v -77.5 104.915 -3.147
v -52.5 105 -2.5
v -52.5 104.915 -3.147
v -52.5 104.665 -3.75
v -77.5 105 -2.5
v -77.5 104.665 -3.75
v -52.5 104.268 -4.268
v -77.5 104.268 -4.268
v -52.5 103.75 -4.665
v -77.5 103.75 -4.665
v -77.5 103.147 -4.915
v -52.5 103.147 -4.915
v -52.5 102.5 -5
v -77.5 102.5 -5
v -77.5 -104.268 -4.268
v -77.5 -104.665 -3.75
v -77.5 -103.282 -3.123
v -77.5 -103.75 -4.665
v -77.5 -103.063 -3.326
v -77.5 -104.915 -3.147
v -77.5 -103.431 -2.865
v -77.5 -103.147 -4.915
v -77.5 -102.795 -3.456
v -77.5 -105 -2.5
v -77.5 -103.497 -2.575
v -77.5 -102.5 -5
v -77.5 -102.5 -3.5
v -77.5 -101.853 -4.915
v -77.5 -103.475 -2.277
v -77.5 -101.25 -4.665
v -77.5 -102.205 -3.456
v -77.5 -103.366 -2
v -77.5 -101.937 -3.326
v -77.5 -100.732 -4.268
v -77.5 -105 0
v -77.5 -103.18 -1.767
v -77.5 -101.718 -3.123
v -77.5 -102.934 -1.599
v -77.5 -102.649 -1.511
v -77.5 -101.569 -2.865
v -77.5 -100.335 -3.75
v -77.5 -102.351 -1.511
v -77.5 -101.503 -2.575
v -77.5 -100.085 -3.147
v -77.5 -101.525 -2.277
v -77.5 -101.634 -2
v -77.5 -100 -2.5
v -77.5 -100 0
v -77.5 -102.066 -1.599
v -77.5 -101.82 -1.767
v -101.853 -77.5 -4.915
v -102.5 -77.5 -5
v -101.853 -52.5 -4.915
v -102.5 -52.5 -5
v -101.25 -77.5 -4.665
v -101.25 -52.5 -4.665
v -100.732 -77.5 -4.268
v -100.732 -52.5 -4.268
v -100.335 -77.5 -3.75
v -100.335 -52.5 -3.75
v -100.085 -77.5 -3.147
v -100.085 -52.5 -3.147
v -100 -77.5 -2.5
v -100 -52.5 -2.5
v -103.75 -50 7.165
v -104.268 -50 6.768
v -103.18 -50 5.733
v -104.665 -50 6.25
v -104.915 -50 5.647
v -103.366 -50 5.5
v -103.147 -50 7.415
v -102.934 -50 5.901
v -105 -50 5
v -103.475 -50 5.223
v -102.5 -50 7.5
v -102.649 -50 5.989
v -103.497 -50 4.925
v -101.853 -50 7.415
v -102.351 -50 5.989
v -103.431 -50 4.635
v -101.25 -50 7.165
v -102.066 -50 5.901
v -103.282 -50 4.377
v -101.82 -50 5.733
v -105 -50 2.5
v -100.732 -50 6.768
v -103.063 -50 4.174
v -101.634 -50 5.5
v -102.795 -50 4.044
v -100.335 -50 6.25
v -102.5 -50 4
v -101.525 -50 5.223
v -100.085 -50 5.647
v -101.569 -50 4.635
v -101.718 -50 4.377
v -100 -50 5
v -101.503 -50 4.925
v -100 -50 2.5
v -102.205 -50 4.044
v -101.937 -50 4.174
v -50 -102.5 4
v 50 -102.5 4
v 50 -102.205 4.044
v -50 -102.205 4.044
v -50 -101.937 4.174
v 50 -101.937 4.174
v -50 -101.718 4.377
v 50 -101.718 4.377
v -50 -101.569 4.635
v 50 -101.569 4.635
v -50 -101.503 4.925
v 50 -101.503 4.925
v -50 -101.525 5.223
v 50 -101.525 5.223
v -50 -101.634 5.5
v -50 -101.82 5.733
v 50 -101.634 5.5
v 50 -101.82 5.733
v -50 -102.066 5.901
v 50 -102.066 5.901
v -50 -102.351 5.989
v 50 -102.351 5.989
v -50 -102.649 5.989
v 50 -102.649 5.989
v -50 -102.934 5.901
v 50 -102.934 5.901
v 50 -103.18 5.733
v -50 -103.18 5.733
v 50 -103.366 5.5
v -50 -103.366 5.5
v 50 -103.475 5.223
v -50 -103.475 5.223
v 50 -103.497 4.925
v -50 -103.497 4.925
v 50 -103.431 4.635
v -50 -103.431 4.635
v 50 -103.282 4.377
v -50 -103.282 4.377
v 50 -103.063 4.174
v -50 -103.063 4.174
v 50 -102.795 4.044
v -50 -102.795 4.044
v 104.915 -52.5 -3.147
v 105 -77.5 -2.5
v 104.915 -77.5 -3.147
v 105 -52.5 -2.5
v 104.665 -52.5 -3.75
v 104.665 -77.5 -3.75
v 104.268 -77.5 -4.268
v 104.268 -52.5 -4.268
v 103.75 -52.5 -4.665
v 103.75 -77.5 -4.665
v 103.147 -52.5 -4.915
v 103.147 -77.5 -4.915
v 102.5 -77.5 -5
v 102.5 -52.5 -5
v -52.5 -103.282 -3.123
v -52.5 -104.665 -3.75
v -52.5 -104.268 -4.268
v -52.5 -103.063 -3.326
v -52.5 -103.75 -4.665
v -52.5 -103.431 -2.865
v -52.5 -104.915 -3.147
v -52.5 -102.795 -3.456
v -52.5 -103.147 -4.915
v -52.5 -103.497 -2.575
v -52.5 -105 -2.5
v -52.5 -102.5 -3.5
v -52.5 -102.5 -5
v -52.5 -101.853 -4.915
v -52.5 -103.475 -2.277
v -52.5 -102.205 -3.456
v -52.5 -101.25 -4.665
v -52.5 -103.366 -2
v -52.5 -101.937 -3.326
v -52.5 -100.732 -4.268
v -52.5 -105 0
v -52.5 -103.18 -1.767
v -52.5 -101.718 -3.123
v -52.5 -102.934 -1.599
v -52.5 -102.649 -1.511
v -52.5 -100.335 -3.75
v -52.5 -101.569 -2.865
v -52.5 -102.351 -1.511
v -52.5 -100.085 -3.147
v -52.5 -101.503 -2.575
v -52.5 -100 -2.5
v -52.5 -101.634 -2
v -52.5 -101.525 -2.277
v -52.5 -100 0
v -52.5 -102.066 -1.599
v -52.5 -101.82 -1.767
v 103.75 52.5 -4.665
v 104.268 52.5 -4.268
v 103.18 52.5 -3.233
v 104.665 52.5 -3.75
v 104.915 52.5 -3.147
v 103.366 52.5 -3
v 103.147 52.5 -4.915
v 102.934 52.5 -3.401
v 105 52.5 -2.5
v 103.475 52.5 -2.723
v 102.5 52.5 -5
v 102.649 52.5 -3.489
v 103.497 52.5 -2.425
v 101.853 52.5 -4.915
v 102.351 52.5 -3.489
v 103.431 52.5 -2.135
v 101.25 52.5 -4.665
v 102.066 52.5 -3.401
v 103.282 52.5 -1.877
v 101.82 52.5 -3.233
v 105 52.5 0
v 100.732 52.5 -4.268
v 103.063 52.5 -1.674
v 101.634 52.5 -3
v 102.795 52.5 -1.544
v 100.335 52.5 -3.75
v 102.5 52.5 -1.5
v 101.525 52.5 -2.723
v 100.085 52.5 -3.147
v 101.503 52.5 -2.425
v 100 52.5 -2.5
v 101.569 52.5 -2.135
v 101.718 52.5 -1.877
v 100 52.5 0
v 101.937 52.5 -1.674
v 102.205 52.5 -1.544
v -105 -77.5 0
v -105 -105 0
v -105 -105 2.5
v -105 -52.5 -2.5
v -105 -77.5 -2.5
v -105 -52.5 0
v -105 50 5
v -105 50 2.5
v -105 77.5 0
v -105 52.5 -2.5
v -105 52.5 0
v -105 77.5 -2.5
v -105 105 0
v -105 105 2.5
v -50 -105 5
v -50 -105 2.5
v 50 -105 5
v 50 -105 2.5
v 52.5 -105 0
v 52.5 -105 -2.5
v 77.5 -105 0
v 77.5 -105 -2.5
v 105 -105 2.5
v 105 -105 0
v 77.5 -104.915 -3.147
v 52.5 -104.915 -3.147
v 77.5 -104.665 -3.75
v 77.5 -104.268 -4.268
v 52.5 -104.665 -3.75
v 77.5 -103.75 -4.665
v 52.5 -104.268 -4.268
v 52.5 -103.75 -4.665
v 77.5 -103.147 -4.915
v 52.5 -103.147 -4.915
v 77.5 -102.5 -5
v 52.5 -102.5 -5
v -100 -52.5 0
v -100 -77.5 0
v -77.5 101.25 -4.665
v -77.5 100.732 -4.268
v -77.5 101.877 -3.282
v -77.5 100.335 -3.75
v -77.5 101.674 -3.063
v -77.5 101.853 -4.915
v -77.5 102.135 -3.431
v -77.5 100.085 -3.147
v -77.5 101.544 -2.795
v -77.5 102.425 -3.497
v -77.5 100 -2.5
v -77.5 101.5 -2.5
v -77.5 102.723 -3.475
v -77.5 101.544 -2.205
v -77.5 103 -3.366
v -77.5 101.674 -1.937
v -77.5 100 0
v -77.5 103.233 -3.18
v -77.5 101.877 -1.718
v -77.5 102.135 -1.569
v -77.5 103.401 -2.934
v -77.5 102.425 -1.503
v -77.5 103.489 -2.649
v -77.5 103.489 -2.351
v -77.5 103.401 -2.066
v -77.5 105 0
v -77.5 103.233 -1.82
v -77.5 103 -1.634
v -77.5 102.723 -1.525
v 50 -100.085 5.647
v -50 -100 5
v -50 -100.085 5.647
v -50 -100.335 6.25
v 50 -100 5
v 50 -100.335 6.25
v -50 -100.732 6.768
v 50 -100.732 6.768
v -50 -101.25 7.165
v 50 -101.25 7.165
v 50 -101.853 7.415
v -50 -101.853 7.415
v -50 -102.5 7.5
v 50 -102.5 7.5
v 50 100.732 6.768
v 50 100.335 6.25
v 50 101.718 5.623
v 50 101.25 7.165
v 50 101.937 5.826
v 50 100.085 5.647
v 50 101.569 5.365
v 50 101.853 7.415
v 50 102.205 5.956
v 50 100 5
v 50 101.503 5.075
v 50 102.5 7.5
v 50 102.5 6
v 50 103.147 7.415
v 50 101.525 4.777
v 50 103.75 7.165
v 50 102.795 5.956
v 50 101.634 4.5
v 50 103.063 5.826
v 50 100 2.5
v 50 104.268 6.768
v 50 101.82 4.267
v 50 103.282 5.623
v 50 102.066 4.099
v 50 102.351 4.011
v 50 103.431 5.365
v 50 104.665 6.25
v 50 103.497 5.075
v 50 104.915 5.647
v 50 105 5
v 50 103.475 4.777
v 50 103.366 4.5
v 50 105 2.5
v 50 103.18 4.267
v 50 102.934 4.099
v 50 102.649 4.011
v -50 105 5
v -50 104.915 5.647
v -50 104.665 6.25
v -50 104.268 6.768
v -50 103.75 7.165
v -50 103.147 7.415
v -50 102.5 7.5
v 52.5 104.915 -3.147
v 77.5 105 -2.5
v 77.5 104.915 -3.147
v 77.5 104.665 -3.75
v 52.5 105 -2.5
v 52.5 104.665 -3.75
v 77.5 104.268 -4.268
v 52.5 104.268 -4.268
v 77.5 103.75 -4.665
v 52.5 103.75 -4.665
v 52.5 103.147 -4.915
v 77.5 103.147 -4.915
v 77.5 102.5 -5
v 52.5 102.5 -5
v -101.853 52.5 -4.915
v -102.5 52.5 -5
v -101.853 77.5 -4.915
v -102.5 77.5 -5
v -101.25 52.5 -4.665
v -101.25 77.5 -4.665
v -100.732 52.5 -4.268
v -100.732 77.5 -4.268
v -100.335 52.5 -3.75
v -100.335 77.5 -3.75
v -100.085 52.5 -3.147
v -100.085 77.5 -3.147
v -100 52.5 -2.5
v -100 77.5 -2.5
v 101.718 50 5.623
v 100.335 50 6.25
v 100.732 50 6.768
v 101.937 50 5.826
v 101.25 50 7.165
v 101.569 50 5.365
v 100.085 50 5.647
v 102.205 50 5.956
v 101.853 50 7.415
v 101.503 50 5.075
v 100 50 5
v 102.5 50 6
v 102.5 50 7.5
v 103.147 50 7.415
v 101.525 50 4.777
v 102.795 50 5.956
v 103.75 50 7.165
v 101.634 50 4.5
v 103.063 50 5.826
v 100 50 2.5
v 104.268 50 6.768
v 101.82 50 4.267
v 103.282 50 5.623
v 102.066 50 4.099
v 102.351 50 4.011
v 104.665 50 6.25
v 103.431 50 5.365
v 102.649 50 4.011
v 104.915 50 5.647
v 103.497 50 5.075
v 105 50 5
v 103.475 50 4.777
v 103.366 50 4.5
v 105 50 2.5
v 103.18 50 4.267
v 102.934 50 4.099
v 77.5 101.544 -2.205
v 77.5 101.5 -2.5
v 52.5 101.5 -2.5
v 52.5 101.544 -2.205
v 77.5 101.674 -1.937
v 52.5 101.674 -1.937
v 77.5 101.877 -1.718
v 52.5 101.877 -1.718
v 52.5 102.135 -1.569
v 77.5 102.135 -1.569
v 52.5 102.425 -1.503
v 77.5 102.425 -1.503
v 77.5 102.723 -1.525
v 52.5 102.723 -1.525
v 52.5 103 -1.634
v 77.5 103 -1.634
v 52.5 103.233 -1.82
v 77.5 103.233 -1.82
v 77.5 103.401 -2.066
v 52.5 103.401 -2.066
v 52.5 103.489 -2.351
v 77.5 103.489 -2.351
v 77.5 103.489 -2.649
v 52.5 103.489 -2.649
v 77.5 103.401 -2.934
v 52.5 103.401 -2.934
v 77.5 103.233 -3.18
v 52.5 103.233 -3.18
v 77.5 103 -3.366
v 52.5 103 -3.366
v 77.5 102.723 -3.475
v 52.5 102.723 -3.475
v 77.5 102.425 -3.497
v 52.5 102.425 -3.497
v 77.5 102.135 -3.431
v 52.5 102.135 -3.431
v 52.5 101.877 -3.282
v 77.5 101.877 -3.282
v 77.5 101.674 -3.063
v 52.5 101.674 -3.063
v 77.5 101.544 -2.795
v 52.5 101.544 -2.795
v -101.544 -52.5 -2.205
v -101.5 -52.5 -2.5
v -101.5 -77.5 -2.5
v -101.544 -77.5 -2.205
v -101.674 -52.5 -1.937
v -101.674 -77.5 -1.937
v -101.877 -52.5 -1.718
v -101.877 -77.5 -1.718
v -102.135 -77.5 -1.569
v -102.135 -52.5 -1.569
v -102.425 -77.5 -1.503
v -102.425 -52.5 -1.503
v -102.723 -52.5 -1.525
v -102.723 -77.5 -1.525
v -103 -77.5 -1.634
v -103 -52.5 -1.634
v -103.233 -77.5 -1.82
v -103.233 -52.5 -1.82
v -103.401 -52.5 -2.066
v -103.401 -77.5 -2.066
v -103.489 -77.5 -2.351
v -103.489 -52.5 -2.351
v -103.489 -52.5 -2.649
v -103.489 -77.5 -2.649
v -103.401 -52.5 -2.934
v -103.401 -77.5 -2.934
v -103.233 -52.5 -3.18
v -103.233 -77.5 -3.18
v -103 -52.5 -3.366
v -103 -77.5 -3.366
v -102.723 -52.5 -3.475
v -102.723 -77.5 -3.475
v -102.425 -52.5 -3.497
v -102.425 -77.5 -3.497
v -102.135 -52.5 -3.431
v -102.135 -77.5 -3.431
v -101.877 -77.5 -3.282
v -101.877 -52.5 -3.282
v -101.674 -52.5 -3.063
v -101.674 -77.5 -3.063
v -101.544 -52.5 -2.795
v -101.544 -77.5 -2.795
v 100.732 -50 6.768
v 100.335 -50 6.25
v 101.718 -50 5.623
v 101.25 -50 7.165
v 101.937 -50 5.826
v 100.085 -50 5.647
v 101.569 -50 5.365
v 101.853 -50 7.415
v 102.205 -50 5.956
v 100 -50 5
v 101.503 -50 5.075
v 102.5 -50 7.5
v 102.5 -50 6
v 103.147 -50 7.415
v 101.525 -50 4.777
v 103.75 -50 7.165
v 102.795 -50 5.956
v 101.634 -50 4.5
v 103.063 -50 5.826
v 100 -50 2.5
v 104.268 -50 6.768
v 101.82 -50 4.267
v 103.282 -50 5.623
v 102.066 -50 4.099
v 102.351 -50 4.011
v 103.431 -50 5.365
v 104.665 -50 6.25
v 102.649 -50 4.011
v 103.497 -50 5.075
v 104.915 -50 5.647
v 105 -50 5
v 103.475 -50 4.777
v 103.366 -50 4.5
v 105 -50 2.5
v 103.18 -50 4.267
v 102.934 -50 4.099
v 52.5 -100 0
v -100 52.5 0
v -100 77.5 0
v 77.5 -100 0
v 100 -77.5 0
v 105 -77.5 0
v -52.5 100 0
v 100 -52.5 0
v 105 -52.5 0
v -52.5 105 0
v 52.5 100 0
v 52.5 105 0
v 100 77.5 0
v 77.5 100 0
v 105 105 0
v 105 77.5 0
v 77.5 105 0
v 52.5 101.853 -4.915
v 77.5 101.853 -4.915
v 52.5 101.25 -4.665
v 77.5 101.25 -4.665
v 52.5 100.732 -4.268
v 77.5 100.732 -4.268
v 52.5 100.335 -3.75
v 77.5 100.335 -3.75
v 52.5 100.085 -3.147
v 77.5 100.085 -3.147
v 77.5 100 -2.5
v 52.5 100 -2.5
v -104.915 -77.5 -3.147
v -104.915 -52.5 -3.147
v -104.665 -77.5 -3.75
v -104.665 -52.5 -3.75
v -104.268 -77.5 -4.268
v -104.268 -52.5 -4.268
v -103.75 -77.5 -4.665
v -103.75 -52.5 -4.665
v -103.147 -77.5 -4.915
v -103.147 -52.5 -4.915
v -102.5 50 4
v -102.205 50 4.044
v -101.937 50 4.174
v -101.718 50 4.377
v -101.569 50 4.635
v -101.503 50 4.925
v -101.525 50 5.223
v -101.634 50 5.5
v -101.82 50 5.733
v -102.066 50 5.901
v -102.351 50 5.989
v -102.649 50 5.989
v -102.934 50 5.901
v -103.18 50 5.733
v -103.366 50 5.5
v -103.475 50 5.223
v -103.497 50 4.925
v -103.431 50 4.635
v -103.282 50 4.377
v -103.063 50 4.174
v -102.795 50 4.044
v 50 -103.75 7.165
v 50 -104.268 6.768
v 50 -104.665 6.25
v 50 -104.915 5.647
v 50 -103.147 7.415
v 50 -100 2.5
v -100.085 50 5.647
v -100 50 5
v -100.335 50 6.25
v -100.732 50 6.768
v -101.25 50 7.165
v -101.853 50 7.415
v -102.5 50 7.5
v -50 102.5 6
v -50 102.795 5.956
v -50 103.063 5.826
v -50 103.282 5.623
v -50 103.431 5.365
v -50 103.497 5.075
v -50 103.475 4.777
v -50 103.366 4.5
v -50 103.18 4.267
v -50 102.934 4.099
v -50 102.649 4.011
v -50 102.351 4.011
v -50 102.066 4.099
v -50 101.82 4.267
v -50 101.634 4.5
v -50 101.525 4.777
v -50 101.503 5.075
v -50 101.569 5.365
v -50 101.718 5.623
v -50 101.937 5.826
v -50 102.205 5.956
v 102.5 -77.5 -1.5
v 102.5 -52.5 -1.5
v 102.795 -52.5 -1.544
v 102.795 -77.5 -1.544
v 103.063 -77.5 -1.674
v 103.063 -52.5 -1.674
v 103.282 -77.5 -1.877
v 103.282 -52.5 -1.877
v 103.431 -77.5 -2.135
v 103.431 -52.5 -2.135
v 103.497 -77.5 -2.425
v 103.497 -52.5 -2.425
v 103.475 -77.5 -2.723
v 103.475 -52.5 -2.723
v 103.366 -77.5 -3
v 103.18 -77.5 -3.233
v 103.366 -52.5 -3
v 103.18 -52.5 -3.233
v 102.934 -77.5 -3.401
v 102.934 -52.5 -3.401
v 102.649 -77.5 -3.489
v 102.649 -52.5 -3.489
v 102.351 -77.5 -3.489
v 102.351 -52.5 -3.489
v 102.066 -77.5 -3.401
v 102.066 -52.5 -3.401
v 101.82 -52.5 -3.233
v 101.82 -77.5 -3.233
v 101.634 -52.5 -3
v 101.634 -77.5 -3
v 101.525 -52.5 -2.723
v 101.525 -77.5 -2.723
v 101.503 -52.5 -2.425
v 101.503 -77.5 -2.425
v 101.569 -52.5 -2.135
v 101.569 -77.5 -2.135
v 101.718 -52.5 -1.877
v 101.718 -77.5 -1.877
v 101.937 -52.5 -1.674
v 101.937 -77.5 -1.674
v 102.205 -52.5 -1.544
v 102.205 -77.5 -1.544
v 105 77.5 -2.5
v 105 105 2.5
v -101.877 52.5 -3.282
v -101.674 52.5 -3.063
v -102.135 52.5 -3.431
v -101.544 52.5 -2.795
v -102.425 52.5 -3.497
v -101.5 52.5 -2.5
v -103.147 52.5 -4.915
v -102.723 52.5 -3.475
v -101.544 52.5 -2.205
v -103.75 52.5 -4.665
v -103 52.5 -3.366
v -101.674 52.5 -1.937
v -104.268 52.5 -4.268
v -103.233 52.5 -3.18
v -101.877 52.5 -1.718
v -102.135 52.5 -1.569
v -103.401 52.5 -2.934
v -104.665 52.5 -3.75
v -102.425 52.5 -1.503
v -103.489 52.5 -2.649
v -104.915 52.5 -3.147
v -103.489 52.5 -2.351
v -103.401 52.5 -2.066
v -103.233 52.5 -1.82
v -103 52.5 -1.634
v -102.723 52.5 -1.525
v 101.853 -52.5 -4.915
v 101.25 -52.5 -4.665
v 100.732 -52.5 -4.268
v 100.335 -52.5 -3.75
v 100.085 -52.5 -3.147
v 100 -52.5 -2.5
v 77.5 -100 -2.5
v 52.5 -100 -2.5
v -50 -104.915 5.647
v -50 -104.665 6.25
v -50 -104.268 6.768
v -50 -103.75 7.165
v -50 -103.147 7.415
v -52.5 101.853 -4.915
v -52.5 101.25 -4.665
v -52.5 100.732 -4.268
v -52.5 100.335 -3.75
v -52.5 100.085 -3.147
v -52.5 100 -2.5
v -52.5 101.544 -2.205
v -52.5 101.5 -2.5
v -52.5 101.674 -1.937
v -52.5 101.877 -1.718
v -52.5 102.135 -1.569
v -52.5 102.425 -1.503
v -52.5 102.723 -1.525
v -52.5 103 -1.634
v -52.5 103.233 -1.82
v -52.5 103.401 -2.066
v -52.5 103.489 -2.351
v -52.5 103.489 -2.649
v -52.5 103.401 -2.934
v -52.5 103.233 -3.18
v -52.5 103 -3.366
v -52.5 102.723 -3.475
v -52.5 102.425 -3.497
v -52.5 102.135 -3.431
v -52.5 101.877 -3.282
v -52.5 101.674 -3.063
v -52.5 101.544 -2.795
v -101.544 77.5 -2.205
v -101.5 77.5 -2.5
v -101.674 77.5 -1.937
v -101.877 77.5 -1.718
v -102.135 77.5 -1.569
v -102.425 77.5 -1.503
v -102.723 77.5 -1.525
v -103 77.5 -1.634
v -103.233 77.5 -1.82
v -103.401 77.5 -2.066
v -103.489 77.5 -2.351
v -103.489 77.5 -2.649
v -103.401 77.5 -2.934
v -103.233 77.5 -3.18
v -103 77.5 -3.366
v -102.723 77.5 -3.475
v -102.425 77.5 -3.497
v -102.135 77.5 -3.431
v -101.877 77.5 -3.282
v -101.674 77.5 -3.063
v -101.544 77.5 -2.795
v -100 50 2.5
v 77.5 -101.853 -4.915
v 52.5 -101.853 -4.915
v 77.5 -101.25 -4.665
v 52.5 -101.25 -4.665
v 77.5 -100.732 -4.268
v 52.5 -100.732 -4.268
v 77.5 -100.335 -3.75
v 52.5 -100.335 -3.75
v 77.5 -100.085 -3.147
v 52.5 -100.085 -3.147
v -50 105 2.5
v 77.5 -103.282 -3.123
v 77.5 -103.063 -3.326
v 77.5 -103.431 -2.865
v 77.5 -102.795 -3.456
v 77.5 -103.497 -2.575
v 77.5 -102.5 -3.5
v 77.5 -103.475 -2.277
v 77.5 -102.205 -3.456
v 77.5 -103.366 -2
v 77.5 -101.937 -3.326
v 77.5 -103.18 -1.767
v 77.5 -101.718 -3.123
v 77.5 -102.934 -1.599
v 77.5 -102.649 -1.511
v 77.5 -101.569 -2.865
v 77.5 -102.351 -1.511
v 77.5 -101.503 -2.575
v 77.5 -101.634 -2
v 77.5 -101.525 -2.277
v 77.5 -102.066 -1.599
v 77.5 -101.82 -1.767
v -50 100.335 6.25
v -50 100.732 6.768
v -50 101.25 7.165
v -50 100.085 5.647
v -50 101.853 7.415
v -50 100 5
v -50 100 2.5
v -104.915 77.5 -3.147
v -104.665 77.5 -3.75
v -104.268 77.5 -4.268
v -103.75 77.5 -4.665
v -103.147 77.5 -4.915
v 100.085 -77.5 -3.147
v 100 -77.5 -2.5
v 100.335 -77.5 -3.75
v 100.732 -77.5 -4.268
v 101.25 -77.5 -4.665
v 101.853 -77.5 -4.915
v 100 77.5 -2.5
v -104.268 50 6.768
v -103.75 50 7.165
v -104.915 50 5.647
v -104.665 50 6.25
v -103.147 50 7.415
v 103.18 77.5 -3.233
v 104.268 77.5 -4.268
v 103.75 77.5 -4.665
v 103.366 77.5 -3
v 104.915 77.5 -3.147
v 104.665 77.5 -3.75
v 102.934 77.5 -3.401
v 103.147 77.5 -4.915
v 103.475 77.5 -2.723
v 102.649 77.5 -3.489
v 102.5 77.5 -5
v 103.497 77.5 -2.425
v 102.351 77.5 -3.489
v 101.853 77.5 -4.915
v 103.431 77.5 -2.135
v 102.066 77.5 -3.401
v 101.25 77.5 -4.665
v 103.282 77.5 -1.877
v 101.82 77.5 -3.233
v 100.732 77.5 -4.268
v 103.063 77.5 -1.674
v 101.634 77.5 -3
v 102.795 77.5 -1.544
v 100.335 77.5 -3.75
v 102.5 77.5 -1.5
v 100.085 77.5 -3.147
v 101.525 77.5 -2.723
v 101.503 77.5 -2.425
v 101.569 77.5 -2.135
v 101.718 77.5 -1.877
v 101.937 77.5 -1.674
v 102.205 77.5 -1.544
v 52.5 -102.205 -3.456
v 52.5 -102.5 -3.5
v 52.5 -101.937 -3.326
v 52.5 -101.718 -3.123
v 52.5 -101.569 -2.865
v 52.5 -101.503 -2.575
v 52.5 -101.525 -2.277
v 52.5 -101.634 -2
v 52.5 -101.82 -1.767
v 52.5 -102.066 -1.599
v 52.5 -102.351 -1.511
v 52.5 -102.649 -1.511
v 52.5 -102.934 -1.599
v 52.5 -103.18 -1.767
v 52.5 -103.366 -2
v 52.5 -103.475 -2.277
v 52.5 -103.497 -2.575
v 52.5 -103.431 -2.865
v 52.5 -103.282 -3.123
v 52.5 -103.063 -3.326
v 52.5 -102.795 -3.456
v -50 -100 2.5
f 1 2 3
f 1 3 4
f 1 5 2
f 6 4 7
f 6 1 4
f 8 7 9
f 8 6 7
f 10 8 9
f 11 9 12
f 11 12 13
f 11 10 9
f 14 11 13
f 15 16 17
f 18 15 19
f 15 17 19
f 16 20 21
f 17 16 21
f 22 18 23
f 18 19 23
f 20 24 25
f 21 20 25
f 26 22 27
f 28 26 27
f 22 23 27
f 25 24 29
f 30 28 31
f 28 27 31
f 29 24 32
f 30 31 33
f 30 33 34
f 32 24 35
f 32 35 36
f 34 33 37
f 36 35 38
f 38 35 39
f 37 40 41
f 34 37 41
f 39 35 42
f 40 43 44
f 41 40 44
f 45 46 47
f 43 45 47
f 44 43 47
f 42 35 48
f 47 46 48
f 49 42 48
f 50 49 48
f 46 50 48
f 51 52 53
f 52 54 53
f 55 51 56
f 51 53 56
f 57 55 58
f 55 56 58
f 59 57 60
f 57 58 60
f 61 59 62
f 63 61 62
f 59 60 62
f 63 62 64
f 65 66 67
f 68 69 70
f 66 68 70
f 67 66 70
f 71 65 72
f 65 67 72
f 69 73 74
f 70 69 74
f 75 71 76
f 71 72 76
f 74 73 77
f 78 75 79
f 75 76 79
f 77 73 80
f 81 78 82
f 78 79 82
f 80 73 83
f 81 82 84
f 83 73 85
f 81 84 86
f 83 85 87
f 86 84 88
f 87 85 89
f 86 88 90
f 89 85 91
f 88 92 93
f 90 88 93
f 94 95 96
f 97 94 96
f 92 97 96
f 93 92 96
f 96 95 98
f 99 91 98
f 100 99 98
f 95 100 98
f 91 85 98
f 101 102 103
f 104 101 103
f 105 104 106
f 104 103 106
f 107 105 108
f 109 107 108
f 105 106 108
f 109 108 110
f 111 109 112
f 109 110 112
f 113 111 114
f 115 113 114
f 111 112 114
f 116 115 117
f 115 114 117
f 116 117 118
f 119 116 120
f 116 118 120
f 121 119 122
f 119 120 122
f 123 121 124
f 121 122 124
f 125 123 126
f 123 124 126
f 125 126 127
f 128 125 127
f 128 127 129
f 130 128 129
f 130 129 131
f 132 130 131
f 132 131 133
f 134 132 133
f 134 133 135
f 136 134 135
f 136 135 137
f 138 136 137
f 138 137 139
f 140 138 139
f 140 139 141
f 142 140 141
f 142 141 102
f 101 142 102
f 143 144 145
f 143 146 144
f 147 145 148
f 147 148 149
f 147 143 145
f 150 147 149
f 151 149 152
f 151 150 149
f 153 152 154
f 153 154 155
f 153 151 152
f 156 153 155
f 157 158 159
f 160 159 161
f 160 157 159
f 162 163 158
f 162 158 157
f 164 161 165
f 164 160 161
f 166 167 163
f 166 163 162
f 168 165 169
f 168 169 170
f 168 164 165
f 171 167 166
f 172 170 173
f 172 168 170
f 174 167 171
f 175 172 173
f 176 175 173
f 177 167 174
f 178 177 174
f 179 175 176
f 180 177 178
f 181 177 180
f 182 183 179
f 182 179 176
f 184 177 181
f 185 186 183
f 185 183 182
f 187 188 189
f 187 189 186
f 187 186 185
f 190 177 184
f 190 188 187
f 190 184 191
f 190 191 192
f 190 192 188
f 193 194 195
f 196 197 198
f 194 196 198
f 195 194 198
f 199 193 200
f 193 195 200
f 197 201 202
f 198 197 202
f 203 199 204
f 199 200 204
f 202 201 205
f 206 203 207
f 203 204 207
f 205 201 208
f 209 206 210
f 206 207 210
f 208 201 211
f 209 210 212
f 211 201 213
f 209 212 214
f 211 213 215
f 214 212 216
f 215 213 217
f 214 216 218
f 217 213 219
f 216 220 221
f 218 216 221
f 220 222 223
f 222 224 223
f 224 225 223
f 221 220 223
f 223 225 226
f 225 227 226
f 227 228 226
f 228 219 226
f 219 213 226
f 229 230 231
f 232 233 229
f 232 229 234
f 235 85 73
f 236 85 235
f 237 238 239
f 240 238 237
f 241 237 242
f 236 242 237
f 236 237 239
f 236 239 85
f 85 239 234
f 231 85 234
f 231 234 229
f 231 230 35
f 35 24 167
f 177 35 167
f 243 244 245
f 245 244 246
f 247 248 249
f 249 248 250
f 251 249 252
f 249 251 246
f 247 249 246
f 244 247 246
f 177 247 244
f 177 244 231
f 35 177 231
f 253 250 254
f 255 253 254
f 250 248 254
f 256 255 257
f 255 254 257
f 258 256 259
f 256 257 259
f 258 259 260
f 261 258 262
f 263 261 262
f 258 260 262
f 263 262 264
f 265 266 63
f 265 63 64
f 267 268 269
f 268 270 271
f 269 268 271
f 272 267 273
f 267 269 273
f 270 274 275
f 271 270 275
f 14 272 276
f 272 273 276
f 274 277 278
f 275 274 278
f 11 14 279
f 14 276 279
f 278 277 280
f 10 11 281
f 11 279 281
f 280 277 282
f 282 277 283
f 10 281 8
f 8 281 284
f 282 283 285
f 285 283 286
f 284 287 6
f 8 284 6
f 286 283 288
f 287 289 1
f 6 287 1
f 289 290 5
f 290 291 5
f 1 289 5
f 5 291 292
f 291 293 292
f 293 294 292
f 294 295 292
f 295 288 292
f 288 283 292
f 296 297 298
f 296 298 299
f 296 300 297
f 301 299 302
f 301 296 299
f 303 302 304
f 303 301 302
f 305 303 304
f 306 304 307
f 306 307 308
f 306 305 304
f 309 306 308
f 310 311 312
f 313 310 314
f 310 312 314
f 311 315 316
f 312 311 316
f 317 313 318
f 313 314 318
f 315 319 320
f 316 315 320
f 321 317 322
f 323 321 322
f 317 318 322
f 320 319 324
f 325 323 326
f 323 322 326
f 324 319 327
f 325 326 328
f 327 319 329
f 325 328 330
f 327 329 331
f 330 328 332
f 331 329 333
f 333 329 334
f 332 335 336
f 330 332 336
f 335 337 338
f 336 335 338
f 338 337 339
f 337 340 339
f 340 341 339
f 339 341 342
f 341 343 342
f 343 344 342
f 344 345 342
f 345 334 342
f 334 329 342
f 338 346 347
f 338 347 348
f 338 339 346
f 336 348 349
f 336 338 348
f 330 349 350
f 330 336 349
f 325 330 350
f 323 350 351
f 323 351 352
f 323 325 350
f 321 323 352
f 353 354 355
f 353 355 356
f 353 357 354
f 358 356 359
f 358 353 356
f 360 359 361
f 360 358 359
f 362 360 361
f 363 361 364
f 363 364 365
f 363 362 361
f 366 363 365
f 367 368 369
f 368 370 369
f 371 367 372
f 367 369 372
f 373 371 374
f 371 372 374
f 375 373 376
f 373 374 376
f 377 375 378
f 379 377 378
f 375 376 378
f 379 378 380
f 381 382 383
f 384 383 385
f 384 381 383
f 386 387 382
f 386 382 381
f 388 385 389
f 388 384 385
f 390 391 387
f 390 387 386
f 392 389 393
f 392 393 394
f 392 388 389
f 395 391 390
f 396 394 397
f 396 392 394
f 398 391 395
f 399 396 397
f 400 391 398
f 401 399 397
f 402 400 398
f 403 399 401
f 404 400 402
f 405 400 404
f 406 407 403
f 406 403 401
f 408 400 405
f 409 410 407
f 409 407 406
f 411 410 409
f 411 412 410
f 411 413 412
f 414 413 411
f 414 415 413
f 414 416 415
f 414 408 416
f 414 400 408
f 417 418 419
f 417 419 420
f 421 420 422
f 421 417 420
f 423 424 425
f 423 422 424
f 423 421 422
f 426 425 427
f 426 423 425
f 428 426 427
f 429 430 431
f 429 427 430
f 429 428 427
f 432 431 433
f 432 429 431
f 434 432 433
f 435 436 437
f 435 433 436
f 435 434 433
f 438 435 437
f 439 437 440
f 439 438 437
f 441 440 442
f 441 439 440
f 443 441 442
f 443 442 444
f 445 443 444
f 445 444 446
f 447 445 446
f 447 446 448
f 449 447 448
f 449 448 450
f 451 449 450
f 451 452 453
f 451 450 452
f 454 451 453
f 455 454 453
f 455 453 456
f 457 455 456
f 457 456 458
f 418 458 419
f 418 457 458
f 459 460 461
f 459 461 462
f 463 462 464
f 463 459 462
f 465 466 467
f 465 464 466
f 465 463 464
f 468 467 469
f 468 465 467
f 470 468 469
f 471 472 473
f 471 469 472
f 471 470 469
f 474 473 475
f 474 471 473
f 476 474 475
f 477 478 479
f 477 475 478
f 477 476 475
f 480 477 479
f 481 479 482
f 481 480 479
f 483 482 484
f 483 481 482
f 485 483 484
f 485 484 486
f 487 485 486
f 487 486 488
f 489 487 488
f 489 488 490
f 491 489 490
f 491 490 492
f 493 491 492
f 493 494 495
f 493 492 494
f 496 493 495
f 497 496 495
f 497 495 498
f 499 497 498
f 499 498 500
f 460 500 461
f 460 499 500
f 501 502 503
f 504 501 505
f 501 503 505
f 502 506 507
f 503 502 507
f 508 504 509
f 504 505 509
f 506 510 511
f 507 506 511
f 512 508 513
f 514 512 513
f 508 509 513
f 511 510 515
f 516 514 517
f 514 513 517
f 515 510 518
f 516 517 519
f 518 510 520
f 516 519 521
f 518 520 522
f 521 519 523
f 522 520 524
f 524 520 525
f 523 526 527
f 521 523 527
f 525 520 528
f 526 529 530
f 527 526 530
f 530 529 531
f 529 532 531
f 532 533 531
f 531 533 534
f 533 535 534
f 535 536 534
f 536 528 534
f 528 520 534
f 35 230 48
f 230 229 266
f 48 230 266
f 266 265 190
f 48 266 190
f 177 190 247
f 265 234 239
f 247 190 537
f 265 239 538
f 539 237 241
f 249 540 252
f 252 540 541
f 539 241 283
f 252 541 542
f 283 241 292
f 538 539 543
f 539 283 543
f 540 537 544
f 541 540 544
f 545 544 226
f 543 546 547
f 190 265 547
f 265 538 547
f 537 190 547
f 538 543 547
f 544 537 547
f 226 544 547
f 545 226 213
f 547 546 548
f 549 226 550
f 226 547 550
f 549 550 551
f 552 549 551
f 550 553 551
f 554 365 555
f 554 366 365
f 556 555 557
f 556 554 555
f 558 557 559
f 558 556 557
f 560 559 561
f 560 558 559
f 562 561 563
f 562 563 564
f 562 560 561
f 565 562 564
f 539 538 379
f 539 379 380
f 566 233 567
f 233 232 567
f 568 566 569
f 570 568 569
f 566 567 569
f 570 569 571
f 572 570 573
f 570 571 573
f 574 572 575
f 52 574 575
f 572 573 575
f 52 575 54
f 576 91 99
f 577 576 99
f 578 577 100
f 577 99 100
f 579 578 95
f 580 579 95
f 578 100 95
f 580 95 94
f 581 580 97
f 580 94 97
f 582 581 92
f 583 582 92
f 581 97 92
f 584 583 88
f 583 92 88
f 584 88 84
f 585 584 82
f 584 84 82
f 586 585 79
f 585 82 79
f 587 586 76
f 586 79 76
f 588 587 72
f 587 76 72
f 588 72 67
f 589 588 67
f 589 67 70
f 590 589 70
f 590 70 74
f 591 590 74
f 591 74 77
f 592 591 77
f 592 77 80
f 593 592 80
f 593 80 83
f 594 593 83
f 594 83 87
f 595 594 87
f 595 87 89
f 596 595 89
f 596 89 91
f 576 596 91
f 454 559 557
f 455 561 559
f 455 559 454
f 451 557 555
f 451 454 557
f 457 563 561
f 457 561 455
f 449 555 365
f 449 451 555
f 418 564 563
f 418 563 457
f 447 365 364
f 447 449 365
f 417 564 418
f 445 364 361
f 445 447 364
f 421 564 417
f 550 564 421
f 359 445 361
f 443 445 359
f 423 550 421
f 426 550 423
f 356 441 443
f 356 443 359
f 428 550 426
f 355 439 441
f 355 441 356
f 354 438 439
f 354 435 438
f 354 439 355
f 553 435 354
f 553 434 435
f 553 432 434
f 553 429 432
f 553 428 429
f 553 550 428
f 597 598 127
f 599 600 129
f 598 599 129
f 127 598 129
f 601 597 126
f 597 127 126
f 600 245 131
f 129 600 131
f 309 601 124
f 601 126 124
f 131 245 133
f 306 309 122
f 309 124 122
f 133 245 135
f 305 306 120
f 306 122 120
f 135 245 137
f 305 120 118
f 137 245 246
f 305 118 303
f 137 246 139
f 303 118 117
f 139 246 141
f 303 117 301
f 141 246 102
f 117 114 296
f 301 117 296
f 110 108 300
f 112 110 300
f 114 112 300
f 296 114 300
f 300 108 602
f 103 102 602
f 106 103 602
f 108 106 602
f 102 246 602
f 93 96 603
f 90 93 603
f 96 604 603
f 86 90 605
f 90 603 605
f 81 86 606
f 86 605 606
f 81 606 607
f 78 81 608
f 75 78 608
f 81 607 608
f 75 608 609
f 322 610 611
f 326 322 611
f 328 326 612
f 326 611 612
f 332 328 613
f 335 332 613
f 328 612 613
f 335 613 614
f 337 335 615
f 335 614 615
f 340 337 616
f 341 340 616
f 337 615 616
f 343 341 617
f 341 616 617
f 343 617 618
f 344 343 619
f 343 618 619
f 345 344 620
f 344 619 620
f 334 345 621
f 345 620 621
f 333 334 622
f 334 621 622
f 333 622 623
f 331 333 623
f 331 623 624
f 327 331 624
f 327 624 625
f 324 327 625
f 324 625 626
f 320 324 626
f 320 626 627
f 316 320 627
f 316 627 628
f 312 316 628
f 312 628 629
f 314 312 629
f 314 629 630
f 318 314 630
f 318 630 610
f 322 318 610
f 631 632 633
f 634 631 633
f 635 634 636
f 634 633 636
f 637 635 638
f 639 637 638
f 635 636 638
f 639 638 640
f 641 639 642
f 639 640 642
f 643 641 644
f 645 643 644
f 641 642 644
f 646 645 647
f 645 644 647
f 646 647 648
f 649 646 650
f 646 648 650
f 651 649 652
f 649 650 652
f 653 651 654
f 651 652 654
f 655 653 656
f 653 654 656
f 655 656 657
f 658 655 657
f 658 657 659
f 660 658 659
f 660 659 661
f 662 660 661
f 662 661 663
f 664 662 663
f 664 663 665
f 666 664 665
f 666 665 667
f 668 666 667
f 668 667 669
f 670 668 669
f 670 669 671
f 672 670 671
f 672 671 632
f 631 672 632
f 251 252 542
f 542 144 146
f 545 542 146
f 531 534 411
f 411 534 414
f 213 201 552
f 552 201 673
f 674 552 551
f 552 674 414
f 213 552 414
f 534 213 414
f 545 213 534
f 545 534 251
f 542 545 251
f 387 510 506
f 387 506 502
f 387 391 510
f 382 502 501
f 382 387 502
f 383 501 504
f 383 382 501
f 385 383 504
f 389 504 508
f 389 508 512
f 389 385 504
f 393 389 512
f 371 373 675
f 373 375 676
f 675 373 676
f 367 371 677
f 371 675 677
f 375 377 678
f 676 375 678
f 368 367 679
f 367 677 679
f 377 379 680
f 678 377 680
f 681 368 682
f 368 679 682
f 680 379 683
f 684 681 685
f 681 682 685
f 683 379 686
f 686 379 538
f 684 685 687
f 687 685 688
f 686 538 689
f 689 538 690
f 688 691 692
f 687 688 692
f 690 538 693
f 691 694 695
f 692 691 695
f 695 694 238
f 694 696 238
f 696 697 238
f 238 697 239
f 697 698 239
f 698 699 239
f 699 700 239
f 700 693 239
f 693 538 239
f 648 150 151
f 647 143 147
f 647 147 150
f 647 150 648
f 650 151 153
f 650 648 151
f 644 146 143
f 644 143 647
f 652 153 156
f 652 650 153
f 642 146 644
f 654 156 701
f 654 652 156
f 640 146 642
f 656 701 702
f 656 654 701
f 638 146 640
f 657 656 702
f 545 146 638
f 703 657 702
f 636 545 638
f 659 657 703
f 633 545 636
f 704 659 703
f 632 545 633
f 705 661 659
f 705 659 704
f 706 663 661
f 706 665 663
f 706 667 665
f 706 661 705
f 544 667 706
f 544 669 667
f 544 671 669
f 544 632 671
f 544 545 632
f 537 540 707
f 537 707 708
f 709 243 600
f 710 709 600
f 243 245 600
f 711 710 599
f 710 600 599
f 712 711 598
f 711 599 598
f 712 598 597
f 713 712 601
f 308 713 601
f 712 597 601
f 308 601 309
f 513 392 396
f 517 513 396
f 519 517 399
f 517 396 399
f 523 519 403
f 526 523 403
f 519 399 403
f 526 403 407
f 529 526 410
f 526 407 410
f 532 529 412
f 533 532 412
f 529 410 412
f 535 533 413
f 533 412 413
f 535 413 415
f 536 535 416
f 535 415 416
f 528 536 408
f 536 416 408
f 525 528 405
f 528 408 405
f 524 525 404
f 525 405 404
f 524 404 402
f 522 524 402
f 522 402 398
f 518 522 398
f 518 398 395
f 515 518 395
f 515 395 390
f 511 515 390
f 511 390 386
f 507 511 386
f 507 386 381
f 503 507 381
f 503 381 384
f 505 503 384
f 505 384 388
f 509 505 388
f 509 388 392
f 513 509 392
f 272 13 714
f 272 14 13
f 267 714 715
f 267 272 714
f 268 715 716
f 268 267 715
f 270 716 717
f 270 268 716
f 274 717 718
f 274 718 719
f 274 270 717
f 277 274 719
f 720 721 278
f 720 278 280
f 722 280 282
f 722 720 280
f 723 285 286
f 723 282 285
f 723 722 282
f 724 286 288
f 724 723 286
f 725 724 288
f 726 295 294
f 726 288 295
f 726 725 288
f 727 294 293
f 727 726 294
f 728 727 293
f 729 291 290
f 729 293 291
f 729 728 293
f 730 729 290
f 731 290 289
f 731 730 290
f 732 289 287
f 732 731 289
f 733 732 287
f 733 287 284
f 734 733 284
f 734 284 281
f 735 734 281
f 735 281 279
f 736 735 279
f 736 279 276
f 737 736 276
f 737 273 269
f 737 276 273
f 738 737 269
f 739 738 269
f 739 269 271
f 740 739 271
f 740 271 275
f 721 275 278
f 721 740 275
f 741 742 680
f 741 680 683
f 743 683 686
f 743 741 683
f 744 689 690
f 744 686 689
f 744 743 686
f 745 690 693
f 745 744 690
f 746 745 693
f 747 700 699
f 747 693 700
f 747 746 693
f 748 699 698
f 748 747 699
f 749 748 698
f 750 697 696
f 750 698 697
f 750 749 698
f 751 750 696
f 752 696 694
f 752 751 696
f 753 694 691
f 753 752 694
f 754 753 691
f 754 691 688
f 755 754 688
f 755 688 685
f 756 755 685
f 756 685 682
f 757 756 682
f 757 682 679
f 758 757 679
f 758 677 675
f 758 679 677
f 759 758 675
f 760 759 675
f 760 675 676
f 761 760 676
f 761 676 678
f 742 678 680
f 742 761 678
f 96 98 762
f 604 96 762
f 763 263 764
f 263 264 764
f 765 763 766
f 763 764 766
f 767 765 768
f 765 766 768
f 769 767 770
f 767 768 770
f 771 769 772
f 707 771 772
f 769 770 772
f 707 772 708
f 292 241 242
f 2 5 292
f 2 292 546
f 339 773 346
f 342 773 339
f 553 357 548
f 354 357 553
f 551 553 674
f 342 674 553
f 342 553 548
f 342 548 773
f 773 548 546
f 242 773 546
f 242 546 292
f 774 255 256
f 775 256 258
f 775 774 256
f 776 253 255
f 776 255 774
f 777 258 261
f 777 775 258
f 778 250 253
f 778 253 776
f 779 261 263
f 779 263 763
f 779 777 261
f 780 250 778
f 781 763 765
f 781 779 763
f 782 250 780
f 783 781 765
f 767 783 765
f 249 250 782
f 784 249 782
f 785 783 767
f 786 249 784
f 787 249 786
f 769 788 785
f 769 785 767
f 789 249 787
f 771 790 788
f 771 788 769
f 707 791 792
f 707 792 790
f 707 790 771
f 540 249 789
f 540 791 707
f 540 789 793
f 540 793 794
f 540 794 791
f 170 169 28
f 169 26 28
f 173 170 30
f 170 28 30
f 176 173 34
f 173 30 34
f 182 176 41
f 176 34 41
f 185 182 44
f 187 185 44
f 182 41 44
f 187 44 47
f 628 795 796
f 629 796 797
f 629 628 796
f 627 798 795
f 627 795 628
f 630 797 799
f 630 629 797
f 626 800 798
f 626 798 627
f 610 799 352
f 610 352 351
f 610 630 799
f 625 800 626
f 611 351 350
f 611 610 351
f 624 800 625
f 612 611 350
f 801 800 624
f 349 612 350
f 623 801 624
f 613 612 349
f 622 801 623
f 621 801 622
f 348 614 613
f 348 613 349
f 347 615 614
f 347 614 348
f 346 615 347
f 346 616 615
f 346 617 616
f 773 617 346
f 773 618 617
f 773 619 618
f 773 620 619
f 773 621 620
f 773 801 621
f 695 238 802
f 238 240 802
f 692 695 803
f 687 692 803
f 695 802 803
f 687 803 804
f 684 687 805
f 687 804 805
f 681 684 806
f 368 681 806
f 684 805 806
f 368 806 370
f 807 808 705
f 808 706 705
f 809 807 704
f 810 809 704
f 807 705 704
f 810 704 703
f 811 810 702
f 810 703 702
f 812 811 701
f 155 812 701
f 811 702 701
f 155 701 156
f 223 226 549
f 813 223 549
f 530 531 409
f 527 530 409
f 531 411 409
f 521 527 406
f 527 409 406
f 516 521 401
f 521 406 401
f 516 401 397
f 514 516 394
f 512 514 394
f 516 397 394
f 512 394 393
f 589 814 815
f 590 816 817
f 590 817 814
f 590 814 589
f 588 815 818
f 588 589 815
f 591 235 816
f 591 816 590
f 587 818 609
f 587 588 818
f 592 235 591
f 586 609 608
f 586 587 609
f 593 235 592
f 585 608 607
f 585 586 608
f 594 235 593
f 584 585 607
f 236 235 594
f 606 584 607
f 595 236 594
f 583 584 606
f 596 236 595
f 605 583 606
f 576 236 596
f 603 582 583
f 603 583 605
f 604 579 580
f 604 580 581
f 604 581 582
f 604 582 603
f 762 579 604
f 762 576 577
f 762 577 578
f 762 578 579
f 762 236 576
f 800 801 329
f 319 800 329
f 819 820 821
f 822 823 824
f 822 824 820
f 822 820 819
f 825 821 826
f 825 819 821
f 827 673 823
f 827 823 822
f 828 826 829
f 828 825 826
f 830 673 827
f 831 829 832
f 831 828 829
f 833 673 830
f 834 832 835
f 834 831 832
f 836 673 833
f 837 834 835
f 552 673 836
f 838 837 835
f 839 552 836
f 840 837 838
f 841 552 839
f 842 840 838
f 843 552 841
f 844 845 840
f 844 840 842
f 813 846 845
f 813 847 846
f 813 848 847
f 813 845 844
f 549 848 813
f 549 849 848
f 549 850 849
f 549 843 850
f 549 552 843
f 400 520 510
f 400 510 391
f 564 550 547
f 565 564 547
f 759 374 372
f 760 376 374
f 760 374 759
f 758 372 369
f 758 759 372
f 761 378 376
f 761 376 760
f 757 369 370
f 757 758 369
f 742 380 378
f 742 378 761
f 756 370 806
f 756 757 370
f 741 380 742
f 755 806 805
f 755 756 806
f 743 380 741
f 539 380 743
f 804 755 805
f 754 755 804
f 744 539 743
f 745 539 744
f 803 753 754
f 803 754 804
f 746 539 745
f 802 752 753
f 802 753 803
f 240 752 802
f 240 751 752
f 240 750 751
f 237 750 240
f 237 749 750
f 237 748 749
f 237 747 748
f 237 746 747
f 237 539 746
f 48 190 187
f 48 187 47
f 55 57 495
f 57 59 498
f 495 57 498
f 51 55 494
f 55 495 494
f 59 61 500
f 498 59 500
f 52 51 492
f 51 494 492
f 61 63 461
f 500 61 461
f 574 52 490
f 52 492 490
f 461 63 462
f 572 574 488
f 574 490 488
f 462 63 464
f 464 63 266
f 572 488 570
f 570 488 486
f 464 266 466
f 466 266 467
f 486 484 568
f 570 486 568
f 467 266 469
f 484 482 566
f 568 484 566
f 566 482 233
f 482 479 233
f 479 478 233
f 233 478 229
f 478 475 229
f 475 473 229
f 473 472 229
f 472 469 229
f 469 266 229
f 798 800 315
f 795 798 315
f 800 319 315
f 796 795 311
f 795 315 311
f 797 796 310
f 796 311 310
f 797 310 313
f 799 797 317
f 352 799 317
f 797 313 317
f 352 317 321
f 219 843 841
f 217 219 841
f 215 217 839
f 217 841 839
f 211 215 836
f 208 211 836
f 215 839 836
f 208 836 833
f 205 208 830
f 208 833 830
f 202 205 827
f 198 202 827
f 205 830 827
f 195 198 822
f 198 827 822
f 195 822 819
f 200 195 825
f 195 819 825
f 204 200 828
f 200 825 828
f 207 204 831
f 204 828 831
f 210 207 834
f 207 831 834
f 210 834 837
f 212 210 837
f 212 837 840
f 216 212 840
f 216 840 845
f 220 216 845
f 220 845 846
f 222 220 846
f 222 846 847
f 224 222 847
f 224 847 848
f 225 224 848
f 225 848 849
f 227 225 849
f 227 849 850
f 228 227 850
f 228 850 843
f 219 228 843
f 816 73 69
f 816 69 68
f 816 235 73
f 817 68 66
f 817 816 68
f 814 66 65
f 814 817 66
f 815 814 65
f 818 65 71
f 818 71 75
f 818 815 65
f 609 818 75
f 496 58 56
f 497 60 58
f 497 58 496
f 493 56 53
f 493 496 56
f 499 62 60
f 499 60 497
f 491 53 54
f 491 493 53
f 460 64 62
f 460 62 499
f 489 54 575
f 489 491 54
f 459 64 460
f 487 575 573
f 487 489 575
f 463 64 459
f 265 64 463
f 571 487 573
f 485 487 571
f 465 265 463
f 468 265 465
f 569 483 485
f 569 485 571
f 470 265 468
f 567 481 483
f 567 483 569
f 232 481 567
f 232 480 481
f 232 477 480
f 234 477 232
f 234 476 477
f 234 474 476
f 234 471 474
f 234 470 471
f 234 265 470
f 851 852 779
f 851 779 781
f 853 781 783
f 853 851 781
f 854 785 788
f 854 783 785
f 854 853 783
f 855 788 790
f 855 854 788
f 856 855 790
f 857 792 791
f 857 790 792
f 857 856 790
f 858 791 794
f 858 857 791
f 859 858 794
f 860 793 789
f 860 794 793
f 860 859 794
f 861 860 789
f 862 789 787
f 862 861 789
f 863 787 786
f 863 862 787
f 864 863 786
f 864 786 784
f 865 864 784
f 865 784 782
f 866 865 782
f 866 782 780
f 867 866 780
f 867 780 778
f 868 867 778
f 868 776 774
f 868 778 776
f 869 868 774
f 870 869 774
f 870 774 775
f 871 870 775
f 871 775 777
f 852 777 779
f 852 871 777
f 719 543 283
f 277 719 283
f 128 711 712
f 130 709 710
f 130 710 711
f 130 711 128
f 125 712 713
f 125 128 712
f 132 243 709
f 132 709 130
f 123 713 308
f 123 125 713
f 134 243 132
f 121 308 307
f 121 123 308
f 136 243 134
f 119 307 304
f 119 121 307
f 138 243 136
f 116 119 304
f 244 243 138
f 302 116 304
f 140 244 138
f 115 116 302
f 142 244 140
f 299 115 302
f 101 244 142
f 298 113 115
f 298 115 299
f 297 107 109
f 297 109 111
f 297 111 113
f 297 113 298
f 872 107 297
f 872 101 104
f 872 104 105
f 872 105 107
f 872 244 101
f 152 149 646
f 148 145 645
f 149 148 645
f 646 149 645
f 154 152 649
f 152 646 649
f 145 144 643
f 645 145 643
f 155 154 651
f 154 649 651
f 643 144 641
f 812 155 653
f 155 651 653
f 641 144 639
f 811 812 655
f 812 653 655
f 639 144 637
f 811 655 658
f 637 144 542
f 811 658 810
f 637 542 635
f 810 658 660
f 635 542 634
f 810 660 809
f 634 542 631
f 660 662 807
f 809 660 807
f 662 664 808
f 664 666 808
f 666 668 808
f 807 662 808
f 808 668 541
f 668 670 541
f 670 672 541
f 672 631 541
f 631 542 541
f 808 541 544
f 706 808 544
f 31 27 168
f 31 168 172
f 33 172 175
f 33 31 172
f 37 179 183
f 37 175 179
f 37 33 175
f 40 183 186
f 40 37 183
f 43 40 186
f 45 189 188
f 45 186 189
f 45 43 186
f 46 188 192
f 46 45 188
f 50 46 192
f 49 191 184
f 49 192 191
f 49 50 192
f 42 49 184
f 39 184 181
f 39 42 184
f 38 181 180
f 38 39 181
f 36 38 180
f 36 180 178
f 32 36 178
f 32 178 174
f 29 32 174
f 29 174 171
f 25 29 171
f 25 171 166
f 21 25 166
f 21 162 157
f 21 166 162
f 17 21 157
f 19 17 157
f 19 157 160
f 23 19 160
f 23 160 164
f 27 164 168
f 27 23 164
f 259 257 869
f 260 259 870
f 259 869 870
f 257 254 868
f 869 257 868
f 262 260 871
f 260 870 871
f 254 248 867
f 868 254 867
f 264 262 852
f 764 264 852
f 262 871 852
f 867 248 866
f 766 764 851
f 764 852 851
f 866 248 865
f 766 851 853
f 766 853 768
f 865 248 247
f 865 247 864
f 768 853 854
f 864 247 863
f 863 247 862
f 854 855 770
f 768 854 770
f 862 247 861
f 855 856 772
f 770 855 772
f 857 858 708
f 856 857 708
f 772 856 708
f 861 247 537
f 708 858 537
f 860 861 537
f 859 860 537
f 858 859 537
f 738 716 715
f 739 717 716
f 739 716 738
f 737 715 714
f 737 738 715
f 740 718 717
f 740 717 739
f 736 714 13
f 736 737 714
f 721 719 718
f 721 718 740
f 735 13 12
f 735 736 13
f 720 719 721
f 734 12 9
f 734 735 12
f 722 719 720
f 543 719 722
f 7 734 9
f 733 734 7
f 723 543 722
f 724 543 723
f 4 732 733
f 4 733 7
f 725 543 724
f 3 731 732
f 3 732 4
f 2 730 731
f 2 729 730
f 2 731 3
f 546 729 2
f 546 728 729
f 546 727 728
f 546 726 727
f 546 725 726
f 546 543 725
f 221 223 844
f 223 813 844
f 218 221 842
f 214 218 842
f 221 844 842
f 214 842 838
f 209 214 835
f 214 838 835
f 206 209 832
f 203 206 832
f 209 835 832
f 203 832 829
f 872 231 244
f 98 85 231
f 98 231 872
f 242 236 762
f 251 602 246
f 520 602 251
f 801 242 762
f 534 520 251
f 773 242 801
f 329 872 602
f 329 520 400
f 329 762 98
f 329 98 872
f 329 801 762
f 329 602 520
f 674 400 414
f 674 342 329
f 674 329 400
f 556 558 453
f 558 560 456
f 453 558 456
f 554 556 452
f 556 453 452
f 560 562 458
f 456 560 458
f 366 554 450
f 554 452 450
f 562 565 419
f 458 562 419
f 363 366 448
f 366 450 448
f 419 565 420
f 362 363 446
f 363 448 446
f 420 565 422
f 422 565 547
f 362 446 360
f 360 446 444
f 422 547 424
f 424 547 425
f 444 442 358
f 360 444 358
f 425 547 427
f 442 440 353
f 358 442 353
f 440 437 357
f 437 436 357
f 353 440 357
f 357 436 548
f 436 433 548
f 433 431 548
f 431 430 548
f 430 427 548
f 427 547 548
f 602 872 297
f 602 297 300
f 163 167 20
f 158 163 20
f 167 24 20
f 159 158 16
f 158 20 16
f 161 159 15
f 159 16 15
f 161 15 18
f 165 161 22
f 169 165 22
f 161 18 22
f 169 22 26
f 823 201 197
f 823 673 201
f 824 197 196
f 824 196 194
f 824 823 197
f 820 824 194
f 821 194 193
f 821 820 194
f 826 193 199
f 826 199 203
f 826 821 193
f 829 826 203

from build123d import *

# Parameters (mm, degrees)
SKETCH_1_W               = 420
SKETCH_1_H               = 420
EXTRUDE_1_DEPTH          = 5
SKETCH_3_W               = 50
SKETCH_3_H               = 10
SKETCH_3_W_2             = 10
SKETCH_3_H_2             = 50
EXTRUDE_2_DEPTH          = 10
SKETCH_4_W               = 200
SKETCH_4_H               = 10
SKETCH_4_W_2             = 10
SKETCH_4_H_2             = 200
EXTRUDE_3_DEPTH          = 10
FILLET_1_R               = 5
SKETCH_5_R               = 2
CUT_EXTRUDE_1_DEPTH      = 422.366823564
SKETCH_6_R               = 2
CUT_EXTRUDE_2_DEPTH      = 375.733238451
CUT_EXTRUDE_3_DEPTH      = 422.366823564
CUT_EXTRUDE_3_DEPTH_BACK = 422.366823564
SKETCH_7_R               = 2
SKETCH_8_R               = 2
CUT_EXTRUDE_4_DEPTH      = 375.733238451
CUT_EXTRUDE_5_DEPTH      = 422.366823564
CUT_EXTRUDE_5_DEPTH_BACK = 422.366823564
SKETCH_9_R               = 2
SKETCH_10_R              = 2
CUT_EXTRUDE_6_DEPTH      = 375.733238451
CUT_EXTRUDE_7_DEPTH      = 422.366823564
CUT_EXTRUDE_7_DEPTH_BACK = 422.366823564
SKETCH_11_R              = 2
SKETCH_12_R              = 2
CUT_EXTRUDE_8_DEPTH      = 375.733238451
SCALE_1_SCALE            = 0.5


with BuildPart() as part:
    # 草图1 → 凸台-拉伸1 (new body)
    with BuildSketch(Plane.XY):
        Rectangle(SKETCH_1_W, SKETCH_1_H)
    extrude(amount=EXTRUDE_1_DEPTH)

    # 草图3 → 凸台-拉伸2 (add)
    with BuildSketch(Plane(origin=(0, 0, 0), x_dir=(-1, 0, 0), z_dir=(0, 0, -1))):
        with Locations((-130, -205)):
            Rectangle(SKETCH_3_W, SKETCH_3_H)
        with Locations((-205, -130)):
            Rectangle(SKETCH_3_W_2, SKETCH_3_H_2)
        with Locations((-205, 130)):
            Rectangle(SKETCH_3_W_2, SKETCH_3_H_2)
        with Locations((-130, 205)):
            Rectangle(SKETCH_3_W, SKETCH_3_H)
        with Locations((205, 130)):
            Rectangle(SKETCH_3_W_2, SKETCH_3_H_2)
        with Locations((130, 205)):
            Rectangle(SKETCH_3_W, SKETCH_3_H)
        with Locations((205, -130)):
            Rectangle(SKETCH_3_W_2, SKETCH_3_H_2)
        with Locations((130, -205)):
            Rectangle(SKETCH_3_W, SKETCH_3_H)
    extrude(amount=EXTRUDE_2_DEPTH)

    # 草图4 → 凸台-拉伸3 (add)
    with BuildSketch(Plane.XY.offset(5)):
        with Locations((0, -205)):
            Rectangle(SKETCH_4_W, SKETCH_4_H)
        with Locations((205, 0)):
            Rectangle(SKETCH_4_W_2, SKETCH_4_H_2)
        with Locations((0, 205)):
            Rectangle(SKETCH_4_W, SKETCH_4_H)
        with Locations((-205, 0)):
            Rectangle(SKETCH_4_W_2, SKETCH_4_H_2)
    extrude(amount=EXTRUDE_3_DEPTH)

    # 圆角1
    fillet_1_edges = [part.edges().sort_by_distance(p)[0] for p in [
        (-210, 0, 15),
        (-200, 0, 15),
        (0, -210, 15),
        (0, -200, 15),
        (0, 200, 15),
        (0, 210, 15),
        (200, 0, 15),
        (210, 0, 15),
        (200, -130, -10),
        (210, -130, -10),
        (130, 210, -10),
        (130, 200, -10),
        (200, 130, -10),
        (210, 130, -10),
        (-130, -210, -10),
        (-130, -200, -10),
        (-130, 210, -10),
        (-130, 200, -10),
        (-210, 130, -10),
        (-200, 130, -10),
        (-210, -130, -10),
        (-200, -130, -10),
        (130, -210, -10),
        (130, -200, -10),
    ]]
    fillet(fillet_1_edges, radius=FILLET_1_R - 0.0001)  # a hair under: the kernel refuses the full size

    # 草图5 → 切除-拉伸1 (cut, through all)
    with BuildSketch(Plane(origin=(0, 155, 0), x_dir=(1, 0, 0), z_dir=(0, 1, 0))):
        with Locations(Location((205, 5, 0), (0, 0, 270))):
            Circle(SKETCH_5_R)
    extrude(amount=-CUT_EXTRUDE_1_DEPTH, mode=Mode.SUBTRACT)

    # 草图6 → 切除-拉伸2 (cut, through all)
    with BuildSketch(Plane(origin=(0, 100, 0), x_dir=(1, 0, 0), z_dir=(0, 1, 0))):
        with Locations(Location((205, -10, 0), (0, 0, 270))):
            Circle(SKETCH_6_R)
    extrude(amount=-CUT_EXTRUDE_2_DEPTH, mode=Mode.SUBTRACT)

    # 草图7 → 切除-拉伸3 (cut, two sides: drawn at the far end of the back side and taken through both)
    with BuildSketch(Plane(origin=(155, 0, 0), x_dir=(0, 0, -1), z_dir=(1, 0, 0)).offset(-CUT_EXTRUDE_3_DEPTH_BACK)):
        with Locations((5, -205)):
            Circle(SKETCH_7_R)
    extrude(amount=CUT_EXTRUDE_3_DEPTH + CUT_EXTRUDE_3_DEPTH_BACK, mode=Mode.SUBTRACT)

    # 草图8 → 切除-拉伸4 (cut, through all)
    with BuildSketch(Plane(origin=(100, 0, 0), x_dir=(0, 0, -1), z_dir=(1, 0, 0))):
        with Locations((-10, -205)):
            Circle(SKETCH_8_R)
    extrude(amount=-CUT_EXTRUDE_4_DEPTH, mode=Mode.SUBTRACT)

    # 草图9 → 切除-拉伸5 (cut, two sides: drawn at the far end of the back side and taken through both)
    with BuildSketch(Plane.XZ.offset(155).offset(-CUT_EXTRUDE_5_DEPTH_BACK)):
        with Locations((-205, -5)):
            Circle(SKETCH_9_R)
    extrude(amount=CUT_EXTRUDE_5_DEPTH + CUT_EXTRUDE_5_DEPTH_BACK, mode=Mode.SUBTRACT)

    # 草图10 → 切除-拉伸6 (cut, through all)
    with BuildSketch(Plane.XZ.offset(100)):
        with Locations(Location((-205, 10, 0), (0, 0, 270))):
            Circle(SKETCH_10_R)
    extrude(amount=-CUT_EXTRUDE_6_DEPTH, mode=Mode.SUBTRACT)

    # 草图11 → 切除-拉伸7 (cut, two sides: drawn at the far end of the back side and taken through both)
    with BuildSketch(Plane.ZY.offset(155).offset(-CUT_EXTRUDE_7_DEPTH_BACK)):
        with Locations(Location((-5, 205, 0), (0, 0, 270))):
            Circle(SKETCH_11_R)
    extrude(amount=CUT_EXTRUDE_7_DEPTH + CUT_EXTRUDE_7_DEPTH_BACK, mode=Mode.SUBTRACT)

    # 草图12 → 切除-拉伸8 (cut, through all)
    with BuildSketch(Plane.ZY.offset(100)):
        with Locations((10, 205)):
            Circle(SKETCH_12_R)
    extrude(amount=-CUT_EXTRUDE_8_DEPTH, mode=Mode.SUBTRACT)


with BuildPart() as part_1:
    # 缩放比例1: scaled about (0, 0, 0)
    add(part.part.scale(SCALE_1_SCALE))


solid = part_1.part
